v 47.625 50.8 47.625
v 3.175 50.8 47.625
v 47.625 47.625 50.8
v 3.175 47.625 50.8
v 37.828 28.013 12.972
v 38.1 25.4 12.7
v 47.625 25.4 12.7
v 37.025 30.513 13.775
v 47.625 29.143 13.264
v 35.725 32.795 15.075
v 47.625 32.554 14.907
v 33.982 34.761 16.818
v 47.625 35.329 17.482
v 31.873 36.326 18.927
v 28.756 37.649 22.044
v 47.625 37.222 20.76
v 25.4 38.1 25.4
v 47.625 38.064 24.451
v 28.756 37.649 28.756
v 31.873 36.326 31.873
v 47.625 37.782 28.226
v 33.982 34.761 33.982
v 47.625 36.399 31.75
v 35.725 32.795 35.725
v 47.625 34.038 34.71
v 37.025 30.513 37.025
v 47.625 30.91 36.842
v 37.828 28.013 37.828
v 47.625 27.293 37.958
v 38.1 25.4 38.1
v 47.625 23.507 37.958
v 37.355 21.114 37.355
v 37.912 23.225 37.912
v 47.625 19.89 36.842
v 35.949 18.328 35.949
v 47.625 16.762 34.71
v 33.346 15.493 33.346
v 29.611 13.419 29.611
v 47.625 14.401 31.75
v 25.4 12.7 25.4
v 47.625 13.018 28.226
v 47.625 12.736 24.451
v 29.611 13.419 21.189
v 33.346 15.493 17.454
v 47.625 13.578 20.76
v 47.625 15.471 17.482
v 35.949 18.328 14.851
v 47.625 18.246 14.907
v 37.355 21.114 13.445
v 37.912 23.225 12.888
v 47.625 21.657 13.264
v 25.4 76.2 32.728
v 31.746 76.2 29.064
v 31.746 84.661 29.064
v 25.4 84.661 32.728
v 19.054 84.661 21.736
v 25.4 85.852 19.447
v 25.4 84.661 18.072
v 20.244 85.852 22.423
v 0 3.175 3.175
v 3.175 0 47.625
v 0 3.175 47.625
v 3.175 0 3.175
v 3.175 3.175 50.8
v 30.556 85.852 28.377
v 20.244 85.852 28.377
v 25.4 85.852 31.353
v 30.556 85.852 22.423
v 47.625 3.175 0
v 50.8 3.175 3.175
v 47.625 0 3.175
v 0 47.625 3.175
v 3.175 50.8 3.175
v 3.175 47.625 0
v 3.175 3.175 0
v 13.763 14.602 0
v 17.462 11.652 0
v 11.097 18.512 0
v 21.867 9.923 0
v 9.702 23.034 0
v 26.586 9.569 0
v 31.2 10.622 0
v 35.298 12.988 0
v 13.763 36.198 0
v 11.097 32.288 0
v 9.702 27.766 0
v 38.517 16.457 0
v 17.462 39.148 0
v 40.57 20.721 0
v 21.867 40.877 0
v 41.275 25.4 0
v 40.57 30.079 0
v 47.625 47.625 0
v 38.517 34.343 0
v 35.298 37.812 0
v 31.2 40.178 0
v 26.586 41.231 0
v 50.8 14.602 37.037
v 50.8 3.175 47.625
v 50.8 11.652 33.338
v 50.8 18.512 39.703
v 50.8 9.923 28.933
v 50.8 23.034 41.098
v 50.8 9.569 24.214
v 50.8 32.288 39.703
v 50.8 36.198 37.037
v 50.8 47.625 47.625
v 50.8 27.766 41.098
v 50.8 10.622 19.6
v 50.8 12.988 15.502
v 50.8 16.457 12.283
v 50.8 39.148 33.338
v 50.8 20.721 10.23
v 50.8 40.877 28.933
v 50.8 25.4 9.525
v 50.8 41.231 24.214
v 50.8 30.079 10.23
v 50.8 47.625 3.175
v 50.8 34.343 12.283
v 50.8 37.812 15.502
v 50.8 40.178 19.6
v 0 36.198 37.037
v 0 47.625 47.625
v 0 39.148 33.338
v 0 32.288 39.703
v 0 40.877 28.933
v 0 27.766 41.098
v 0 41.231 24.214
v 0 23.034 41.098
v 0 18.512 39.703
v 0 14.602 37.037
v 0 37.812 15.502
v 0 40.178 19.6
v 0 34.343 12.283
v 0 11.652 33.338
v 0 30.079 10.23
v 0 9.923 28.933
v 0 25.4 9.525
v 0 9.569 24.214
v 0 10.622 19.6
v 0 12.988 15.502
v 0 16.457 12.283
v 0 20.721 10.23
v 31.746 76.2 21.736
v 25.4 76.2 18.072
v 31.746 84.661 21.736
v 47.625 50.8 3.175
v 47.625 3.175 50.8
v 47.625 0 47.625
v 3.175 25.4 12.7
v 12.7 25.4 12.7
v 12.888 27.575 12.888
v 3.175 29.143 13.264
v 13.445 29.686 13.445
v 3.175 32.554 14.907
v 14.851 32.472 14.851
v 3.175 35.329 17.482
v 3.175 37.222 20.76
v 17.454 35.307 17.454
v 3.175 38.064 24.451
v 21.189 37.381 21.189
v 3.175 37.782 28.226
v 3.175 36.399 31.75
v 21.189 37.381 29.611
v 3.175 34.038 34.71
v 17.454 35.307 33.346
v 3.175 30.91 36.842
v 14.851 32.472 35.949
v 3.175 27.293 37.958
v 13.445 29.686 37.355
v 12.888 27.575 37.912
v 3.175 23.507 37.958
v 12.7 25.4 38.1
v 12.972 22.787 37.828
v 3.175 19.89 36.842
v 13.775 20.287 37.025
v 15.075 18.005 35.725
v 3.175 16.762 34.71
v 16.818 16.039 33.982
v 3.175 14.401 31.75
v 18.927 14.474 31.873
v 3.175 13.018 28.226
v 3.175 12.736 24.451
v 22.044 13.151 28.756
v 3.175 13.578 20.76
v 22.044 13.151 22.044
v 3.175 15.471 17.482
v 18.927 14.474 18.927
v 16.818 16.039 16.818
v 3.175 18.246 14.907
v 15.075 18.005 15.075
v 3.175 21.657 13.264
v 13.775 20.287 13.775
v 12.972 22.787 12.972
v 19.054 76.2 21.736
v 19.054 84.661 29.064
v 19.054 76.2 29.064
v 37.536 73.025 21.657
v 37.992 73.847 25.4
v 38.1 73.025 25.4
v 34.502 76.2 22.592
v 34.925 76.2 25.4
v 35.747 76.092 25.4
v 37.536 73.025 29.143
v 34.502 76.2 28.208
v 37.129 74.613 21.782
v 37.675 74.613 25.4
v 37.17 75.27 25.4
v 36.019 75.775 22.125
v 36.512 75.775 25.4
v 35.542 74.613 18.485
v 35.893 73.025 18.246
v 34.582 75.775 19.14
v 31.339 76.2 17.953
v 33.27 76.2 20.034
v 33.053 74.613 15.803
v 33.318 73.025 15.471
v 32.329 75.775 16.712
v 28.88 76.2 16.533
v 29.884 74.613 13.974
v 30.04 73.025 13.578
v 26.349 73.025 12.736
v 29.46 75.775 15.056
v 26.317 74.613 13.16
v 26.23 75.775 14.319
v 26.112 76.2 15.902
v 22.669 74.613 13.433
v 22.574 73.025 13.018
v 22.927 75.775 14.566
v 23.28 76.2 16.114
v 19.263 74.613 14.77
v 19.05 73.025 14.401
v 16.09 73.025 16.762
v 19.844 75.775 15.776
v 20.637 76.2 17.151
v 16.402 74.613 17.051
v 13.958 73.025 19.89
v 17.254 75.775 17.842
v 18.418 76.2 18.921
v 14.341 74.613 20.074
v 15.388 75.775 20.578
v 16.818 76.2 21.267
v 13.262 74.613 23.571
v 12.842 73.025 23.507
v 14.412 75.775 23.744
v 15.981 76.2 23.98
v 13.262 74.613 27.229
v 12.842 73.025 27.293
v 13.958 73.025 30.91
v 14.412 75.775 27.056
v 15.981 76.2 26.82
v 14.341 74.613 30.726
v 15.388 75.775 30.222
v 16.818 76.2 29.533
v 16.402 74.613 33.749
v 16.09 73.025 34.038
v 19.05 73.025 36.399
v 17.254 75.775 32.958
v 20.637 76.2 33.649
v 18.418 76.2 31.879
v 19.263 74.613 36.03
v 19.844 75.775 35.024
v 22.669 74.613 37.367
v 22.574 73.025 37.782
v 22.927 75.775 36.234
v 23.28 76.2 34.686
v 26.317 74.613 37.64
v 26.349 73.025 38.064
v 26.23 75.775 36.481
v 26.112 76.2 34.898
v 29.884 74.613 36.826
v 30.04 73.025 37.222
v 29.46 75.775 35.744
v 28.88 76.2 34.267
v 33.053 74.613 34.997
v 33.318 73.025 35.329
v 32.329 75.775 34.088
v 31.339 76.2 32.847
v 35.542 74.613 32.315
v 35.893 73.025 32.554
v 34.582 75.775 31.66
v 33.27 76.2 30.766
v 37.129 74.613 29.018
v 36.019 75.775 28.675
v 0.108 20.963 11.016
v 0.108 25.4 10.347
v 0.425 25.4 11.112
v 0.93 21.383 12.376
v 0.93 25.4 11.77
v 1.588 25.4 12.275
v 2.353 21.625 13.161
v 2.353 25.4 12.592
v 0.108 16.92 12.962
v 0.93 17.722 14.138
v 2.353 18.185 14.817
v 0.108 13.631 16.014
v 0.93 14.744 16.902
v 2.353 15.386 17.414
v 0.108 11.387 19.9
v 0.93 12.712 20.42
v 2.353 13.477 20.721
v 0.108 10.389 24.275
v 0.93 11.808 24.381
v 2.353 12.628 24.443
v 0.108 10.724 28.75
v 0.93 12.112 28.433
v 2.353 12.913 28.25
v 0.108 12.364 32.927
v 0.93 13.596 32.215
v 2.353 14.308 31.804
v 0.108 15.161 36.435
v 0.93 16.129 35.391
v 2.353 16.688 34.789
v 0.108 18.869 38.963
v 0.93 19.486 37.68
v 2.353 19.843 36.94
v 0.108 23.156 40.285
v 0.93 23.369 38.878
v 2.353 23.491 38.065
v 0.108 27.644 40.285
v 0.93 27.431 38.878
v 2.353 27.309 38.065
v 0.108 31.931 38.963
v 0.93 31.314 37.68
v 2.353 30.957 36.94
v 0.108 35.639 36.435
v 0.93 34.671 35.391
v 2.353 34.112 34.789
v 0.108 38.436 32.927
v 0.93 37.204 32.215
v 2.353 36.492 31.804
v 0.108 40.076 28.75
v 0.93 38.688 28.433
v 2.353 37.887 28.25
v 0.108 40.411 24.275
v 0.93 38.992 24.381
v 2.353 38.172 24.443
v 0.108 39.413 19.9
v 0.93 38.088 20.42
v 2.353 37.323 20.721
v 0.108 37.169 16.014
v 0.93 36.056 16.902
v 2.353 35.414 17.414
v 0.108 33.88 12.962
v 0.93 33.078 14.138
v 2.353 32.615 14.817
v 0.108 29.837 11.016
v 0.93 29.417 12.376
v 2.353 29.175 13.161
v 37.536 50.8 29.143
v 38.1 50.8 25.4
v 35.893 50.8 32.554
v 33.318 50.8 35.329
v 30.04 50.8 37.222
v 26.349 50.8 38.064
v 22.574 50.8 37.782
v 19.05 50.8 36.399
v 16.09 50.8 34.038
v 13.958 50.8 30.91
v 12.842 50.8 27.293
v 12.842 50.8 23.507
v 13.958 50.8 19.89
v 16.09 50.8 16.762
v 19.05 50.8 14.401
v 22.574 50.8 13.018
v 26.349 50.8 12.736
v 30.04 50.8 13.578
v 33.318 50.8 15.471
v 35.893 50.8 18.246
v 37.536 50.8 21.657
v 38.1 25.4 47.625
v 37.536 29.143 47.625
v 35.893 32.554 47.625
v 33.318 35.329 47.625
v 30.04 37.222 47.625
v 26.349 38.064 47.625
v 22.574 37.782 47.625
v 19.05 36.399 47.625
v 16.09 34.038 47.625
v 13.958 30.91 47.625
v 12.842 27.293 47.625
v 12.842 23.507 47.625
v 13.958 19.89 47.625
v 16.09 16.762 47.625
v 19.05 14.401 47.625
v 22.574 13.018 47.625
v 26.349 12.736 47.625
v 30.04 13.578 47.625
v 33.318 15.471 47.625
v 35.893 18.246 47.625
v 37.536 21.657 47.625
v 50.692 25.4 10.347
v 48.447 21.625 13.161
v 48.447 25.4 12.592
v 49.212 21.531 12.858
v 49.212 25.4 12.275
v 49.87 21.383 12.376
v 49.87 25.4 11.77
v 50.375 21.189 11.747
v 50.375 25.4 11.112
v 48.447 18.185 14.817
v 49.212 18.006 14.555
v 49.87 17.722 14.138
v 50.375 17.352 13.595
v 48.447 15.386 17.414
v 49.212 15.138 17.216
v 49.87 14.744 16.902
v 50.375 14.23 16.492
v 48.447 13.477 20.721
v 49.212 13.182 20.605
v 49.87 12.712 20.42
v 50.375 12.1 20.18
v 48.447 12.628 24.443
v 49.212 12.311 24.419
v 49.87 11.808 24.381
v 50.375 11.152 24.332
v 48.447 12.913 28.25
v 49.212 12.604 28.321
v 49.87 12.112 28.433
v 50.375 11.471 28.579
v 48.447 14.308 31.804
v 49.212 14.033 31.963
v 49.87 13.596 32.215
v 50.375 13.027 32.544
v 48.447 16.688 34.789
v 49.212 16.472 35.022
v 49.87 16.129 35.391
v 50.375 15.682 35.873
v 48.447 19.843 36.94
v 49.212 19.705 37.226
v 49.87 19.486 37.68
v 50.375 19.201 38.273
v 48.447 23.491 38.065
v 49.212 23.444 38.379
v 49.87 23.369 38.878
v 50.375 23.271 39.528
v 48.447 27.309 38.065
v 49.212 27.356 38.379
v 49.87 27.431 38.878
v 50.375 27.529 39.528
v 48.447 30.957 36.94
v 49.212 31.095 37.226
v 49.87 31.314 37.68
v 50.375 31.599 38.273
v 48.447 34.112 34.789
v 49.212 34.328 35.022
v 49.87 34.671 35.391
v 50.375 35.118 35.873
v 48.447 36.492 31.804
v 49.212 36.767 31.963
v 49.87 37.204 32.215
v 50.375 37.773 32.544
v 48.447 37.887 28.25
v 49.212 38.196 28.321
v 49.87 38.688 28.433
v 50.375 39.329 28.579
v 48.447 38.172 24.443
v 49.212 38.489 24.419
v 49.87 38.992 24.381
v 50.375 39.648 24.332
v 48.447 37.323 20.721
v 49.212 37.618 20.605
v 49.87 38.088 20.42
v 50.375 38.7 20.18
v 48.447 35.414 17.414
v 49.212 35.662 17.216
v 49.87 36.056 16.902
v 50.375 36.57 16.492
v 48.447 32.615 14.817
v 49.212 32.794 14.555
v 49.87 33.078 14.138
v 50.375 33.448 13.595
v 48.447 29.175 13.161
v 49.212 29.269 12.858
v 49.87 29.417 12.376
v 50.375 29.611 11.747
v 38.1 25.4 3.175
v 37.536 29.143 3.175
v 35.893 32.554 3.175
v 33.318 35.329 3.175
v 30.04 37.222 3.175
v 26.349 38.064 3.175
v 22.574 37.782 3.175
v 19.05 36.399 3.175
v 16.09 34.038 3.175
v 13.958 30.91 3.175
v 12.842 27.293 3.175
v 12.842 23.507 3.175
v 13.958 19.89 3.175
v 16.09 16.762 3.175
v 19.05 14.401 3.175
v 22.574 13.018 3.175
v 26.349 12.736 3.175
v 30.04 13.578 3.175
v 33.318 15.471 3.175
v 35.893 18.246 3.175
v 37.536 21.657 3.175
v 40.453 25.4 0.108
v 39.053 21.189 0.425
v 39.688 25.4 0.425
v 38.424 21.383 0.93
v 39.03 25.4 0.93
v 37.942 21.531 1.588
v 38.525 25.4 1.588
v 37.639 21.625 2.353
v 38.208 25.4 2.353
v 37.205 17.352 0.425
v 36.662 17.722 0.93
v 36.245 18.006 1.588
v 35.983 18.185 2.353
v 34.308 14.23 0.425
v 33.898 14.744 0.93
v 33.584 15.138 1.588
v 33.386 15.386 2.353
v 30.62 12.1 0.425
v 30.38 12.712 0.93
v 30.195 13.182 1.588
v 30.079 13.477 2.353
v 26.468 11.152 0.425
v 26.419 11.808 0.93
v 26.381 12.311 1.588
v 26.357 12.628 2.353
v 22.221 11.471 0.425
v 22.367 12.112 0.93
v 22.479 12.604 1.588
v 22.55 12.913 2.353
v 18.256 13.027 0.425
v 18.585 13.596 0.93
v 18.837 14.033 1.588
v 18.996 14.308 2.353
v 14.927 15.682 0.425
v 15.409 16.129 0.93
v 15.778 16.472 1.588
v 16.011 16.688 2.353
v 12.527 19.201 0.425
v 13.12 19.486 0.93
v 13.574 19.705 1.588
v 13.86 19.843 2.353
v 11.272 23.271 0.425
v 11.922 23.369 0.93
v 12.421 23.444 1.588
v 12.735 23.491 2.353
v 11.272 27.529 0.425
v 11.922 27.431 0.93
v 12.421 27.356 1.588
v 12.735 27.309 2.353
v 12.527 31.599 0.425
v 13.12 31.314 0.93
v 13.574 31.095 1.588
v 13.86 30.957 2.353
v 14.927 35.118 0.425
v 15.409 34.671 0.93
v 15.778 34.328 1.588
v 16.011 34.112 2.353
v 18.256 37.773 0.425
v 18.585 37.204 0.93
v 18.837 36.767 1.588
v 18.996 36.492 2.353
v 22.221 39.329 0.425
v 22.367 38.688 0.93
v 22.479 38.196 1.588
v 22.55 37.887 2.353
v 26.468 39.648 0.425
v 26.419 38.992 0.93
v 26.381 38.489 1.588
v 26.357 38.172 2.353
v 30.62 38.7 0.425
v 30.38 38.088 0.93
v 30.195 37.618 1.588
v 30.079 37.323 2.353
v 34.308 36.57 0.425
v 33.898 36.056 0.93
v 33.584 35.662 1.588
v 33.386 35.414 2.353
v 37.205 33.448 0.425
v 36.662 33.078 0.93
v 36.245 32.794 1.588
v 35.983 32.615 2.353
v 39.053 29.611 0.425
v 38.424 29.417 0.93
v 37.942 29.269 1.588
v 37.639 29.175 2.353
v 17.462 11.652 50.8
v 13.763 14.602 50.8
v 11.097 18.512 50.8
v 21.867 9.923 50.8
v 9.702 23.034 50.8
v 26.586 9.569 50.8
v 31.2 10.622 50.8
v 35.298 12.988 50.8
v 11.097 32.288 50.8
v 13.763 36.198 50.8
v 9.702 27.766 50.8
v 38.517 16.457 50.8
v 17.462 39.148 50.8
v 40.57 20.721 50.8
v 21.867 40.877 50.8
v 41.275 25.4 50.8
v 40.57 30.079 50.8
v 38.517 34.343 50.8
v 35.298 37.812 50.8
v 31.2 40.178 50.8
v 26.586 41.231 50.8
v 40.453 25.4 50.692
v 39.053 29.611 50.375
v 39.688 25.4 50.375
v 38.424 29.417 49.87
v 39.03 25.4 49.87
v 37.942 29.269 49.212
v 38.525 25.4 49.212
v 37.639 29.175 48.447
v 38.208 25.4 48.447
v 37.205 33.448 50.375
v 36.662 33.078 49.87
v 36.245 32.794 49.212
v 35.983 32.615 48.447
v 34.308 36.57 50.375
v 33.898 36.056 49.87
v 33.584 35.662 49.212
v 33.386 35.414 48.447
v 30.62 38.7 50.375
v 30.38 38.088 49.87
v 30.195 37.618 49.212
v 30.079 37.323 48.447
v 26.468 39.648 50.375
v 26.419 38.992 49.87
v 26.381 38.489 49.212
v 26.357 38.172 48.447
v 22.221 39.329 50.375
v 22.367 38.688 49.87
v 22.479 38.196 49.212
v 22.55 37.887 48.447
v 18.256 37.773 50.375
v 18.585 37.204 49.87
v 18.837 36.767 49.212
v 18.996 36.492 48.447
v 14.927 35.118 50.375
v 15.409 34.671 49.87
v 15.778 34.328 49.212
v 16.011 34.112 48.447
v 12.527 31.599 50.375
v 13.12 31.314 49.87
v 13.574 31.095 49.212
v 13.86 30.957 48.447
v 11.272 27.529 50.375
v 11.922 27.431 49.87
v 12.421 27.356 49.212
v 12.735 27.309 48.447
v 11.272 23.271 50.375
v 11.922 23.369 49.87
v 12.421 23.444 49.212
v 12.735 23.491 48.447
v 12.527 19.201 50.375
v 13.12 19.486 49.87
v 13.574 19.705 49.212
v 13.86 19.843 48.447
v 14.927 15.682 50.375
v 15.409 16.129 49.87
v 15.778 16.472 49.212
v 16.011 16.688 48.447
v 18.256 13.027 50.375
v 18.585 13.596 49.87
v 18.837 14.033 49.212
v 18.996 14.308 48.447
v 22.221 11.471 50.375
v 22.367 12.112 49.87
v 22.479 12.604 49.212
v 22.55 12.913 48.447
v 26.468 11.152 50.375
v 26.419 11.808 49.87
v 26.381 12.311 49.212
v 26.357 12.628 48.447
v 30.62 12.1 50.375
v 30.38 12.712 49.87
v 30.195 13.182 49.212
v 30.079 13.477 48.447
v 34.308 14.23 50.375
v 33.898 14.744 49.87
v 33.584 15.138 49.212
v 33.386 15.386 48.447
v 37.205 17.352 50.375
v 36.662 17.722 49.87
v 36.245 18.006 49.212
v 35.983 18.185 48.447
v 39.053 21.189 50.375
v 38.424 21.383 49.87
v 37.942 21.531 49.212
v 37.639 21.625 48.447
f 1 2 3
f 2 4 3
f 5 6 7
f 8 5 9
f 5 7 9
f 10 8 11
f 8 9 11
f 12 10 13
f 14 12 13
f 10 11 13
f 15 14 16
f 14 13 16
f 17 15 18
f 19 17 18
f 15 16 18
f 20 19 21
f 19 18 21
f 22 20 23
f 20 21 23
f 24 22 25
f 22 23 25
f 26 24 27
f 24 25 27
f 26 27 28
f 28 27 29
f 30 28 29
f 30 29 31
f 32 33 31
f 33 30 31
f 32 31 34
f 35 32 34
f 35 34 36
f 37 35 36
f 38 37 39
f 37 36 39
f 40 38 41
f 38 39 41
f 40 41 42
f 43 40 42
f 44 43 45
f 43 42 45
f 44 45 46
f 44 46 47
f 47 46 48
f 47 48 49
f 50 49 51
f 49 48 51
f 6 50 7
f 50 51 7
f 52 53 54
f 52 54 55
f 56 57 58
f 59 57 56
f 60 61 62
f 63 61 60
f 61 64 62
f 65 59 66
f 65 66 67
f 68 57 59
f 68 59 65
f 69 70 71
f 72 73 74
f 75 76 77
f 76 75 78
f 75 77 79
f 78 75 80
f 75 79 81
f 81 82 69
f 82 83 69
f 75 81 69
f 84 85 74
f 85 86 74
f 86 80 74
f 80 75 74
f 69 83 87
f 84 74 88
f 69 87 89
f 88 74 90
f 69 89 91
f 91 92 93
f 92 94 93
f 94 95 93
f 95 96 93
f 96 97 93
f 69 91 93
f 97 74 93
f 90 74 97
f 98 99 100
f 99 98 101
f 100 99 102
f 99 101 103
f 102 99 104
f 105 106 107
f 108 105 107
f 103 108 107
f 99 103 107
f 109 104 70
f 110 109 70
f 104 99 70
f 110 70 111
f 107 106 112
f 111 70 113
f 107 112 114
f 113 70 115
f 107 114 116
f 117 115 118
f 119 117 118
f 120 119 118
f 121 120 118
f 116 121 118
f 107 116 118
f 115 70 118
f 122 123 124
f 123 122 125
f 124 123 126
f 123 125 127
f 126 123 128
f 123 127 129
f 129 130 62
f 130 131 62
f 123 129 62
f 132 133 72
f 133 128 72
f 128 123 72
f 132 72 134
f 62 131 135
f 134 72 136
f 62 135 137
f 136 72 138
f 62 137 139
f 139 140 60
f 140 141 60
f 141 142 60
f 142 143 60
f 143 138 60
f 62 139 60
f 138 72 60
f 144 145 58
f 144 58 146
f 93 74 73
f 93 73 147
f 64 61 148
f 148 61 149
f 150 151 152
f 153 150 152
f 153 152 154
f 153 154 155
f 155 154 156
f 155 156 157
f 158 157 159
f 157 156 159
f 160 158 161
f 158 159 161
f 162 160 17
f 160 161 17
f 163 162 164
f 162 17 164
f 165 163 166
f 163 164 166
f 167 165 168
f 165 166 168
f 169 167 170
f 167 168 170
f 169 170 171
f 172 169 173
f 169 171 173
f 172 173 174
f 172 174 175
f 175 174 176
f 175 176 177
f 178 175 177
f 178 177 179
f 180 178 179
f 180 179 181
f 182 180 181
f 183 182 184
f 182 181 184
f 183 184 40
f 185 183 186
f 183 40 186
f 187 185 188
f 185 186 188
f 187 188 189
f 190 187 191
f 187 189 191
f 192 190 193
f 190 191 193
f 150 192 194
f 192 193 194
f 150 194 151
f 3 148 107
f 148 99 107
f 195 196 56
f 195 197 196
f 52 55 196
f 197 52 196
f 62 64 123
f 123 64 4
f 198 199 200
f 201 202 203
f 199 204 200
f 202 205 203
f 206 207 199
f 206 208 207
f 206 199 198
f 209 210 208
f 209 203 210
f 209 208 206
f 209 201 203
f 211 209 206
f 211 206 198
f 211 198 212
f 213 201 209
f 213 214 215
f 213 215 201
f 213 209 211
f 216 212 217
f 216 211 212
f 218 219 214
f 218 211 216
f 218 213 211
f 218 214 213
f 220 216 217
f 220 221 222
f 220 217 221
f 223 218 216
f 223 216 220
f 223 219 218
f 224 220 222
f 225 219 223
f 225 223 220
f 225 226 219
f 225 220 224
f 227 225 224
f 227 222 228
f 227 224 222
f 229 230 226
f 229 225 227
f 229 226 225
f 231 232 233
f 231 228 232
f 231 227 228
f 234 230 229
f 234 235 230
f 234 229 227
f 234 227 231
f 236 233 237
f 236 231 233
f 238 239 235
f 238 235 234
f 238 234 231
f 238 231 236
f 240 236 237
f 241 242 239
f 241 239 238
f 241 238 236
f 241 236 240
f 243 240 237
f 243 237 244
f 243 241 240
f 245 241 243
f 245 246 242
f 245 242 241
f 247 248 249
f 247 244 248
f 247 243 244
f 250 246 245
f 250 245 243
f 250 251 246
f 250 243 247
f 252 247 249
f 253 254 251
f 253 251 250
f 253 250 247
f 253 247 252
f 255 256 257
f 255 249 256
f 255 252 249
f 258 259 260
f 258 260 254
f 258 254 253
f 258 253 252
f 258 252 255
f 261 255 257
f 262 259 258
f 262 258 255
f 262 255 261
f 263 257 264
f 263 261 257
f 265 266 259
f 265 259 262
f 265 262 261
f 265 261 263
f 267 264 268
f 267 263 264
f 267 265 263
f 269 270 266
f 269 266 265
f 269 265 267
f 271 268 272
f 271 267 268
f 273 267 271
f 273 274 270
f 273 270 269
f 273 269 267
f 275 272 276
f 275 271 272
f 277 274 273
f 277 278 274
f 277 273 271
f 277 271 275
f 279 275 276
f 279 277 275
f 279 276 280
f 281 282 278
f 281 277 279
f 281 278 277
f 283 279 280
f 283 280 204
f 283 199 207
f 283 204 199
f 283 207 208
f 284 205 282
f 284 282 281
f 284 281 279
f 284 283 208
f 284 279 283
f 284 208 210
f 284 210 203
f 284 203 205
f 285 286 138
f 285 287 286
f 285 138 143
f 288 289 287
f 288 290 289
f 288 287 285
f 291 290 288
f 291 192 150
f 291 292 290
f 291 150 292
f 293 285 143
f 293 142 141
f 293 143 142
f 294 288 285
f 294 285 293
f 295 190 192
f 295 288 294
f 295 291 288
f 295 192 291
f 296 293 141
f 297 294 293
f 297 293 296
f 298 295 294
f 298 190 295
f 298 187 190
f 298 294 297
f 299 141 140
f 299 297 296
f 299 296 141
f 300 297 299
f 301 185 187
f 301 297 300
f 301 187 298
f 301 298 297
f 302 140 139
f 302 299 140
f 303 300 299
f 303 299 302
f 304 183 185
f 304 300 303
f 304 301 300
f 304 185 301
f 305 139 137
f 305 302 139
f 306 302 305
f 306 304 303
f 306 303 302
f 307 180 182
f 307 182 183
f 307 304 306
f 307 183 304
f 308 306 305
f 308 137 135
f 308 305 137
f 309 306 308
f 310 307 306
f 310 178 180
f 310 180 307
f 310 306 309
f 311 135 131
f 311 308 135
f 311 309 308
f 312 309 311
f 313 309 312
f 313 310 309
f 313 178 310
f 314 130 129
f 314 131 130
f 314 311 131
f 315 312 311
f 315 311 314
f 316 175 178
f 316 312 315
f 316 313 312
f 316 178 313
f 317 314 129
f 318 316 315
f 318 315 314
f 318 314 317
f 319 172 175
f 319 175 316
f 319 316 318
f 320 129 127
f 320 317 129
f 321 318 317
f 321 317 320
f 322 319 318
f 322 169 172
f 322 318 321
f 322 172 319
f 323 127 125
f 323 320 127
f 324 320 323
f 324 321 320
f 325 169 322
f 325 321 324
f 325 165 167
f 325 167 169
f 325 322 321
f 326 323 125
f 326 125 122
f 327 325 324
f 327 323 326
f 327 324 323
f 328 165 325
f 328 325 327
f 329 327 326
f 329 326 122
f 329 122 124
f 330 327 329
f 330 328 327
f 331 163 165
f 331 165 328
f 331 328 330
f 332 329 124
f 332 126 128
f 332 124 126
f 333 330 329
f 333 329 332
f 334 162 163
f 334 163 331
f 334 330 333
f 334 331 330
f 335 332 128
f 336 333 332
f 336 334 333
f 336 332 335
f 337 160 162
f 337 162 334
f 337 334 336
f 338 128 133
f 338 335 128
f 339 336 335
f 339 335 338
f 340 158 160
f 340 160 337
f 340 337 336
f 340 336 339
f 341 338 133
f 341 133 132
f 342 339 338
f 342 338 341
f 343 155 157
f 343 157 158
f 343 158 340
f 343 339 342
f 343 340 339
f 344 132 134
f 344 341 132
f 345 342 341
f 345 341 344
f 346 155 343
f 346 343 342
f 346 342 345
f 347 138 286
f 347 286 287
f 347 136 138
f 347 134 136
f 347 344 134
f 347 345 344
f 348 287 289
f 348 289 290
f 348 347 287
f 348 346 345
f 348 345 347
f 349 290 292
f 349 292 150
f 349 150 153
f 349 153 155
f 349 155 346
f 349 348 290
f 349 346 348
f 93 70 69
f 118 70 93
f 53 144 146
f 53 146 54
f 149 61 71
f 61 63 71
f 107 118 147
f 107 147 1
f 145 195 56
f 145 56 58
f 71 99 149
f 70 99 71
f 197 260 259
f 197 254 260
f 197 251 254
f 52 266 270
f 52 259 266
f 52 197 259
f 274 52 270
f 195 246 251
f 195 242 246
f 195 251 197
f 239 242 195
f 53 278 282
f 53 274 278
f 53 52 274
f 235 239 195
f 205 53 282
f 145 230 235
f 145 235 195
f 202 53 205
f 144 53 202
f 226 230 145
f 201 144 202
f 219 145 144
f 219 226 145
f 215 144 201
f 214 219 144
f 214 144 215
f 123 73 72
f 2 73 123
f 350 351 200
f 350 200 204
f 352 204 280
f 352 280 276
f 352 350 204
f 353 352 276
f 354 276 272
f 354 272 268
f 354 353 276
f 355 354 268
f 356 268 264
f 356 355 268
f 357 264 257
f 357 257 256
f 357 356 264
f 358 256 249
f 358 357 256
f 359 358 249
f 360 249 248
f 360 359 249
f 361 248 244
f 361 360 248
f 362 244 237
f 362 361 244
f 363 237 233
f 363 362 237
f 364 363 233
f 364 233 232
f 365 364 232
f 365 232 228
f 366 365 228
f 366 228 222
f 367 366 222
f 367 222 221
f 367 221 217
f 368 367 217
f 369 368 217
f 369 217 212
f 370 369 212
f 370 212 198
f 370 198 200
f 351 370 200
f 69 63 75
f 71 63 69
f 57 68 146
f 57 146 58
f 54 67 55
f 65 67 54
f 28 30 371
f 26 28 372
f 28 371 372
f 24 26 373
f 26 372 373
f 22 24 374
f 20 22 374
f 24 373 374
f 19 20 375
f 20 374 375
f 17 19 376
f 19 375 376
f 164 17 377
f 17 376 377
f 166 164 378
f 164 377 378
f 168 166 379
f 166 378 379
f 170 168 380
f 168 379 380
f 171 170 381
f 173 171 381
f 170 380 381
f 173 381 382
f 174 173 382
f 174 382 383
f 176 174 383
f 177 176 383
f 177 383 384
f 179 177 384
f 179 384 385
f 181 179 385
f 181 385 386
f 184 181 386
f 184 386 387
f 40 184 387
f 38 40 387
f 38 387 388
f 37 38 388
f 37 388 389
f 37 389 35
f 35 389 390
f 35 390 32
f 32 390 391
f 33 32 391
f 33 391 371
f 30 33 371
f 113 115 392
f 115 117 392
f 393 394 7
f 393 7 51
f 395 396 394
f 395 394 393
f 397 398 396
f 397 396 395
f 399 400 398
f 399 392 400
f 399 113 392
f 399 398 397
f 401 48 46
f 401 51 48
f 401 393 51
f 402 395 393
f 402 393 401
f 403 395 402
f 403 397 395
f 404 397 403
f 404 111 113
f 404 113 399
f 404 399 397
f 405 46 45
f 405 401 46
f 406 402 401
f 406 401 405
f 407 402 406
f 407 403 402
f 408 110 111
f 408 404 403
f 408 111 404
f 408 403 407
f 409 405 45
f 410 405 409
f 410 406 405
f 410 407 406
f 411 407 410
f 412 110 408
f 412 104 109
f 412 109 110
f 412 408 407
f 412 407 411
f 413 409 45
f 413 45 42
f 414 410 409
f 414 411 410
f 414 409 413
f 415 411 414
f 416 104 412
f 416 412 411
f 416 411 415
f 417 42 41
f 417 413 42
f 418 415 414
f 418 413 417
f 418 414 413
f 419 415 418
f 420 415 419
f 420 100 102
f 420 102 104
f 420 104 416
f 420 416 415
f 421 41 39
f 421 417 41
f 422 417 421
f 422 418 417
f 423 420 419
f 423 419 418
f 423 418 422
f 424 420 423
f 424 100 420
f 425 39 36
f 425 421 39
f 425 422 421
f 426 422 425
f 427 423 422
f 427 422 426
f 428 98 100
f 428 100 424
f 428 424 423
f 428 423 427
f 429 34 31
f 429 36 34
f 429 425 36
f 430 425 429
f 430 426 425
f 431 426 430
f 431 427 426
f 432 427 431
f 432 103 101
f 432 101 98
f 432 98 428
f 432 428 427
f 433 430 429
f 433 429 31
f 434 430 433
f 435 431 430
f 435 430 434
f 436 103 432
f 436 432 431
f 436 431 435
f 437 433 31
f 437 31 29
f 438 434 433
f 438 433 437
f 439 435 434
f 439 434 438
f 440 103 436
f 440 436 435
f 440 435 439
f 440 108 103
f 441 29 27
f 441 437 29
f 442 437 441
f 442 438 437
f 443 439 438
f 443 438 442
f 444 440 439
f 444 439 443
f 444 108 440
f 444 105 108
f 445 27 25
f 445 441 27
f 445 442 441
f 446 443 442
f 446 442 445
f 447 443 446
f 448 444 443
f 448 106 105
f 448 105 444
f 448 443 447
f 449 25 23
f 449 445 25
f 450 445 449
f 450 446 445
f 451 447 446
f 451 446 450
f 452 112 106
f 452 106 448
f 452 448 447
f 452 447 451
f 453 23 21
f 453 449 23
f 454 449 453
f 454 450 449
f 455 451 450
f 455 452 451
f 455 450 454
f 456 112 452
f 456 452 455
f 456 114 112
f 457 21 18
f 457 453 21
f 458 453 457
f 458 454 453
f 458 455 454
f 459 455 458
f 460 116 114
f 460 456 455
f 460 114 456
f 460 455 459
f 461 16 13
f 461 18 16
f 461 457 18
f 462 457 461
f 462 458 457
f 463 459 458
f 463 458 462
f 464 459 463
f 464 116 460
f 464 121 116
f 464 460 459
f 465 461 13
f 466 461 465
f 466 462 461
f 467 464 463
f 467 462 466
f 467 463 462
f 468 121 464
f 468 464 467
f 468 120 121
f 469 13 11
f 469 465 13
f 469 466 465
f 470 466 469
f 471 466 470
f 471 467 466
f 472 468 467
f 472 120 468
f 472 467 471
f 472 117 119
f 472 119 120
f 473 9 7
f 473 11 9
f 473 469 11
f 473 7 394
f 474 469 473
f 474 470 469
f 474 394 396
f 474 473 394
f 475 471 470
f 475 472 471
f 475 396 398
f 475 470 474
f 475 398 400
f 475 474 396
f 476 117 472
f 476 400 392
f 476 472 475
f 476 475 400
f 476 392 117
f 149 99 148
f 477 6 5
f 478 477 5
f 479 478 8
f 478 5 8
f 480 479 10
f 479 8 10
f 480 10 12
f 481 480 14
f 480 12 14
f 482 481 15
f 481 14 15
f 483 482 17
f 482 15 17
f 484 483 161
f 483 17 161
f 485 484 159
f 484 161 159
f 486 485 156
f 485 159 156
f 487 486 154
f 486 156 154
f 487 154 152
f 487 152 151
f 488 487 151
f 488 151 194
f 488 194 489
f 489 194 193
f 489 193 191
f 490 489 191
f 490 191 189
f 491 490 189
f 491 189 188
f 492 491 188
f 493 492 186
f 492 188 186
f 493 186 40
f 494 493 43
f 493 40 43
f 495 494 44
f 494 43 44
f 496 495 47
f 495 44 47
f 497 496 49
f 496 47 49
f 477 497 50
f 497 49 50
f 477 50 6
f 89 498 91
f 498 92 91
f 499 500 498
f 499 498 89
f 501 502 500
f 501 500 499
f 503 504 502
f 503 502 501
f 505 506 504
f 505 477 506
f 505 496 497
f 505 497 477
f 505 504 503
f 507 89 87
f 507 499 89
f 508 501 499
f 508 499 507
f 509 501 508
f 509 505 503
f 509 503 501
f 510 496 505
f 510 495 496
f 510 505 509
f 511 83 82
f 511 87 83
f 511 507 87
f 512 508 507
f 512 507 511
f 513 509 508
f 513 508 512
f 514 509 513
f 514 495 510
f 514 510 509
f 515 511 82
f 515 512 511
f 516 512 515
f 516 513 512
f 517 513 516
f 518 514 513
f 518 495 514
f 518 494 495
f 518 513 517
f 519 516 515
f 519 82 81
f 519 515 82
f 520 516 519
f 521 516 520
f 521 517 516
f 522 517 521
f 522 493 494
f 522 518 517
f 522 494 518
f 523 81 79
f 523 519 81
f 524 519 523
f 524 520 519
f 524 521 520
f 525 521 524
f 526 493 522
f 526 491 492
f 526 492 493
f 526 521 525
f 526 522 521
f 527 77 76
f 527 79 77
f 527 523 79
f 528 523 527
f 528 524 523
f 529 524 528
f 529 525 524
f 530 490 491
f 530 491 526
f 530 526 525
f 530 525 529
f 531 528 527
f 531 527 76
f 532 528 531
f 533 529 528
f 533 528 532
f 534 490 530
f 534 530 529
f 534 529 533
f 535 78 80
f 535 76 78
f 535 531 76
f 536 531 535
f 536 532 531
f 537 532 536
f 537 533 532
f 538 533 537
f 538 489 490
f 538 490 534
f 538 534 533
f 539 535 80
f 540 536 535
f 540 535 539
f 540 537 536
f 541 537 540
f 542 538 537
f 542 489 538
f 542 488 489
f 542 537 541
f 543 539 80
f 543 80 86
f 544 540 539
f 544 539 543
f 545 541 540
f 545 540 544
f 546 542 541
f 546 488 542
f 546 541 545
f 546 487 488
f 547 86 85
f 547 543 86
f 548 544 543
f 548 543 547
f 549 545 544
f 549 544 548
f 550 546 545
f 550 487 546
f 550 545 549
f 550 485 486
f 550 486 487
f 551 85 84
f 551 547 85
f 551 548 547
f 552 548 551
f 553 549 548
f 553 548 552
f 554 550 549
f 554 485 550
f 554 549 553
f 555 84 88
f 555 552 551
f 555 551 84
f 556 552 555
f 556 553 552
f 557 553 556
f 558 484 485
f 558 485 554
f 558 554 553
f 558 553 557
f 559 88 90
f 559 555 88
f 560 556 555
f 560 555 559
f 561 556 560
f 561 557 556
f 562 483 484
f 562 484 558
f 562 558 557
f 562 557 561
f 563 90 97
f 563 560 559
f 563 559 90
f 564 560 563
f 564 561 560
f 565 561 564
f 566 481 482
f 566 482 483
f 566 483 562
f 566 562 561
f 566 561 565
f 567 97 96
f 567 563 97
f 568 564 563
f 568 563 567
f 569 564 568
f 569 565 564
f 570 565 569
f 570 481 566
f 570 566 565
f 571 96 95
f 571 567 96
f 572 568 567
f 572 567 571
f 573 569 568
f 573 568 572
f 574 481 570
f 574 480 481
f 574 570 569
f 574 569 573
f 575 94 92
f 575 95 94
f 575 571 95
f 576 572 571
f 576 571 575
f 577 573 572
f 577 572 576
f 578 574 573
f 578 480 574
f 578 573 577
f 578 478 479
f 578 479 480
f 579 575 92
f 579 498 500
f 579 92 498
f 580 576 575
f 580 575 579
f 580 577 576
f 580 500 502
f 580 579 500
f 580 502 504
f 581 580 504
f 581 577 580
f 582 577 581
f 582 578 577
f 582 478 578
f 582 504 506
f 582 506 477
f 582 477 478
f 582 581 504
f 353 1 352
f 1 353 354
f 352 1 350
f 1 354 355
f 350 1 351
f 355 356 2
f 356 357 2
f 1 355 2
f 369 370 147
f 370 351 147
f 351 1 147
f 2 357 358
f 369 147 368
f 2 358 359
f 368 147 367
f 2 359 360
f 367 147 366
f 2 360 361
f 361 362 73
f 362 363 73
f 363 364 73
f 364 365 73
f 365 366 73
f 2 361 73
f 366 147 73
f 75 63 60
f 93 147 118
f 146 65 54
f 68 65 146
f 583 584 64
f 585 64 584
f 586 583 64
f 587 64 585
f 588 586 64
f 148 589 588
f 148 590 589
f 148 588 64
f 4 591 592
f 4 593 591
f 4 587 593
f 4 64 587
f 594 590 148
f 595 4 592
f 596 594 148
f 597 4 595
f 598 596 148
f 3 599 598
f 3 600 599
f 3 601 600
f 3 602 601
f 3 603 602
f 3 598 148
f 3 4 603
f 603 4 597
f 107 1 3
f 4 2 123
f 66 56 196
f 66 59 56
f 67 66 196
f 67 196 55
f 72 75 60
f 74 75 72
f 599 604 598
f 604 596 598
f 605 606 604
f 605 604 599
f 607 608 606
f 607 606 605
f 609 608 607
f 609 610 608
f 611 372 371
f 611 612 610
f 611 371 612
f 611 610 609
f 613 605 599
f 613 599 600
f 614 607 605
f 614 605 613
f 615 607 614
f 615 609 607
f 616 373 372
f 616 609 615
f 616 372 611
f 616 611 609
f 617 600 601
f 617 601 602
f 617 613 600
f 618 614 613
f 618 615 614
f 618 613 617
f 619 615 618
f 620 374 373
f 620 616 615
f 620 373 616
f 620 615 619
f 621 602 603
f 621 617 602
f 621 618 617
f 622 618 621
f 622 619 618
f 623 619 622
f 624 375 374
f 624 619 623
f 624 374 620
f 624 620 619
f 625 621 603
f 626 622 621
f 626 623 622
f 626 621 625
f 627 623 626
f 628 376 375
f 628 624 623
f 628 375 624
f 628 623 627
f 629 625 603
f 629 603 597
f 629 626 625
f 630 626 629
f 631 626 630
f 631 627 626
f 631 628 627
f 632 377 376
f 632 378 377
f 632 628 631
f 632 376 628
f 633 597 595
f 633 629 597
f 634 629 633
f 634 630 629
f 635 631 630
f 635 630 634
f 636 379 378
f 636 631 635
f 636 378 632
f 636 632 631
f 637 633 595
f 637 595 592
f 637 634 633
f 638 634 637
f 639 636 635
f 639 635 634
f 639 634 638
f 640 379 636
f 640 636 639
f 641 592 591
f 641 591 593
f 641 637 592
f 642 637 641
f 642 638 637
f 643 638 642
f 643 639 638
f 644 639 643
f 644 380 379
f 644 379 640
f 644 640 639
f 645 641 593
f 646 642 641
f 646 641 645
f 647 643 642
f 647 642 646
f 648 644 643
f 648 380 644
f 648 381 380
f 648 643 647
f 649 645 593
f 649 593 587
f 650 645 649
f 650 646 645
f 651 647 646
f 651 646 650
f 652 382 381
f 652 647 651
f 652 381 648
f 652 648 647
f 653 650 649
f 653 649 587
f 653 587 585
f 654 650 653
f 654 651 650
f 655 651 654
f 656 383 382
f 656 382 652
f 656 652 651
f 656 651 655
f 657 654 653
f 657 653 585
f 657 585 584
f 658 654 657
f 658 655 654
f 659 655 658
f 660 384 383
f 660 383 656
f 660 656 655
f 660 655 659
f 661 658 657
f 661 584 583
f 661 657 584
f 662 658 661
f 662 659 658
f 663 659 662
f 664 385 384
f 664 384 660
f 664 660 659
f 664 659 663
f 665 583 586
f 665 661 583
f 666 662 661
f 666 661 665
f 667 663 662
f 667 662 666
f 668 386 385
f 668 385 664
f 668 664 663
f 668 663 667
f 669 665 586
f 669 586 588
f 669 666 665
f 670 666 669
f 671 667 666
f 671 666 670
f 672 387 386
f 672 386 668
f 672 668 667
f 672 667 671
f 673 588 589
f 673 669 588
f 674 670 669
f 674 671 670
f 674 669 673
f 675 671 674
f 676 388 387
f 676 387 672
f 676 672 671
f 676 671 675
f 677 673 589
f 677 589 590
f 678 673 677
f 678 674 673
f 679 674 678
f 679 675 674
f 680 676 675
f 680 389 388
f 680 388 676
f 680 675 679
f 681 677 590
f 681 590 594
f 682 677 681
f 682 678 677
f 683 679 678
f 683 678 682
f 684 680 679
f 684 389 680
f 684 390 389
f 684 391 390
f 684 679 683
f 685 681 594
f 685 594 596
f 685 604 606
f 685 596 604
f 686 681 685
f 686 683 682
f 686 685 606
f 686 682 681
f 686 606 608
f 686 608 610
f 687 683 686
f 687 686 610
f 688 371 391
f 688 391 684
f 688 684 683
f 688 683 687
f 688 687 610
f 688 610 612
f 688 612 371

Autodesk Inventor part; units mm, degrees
ref_plane "YZ Plane" through (0, 0, 0) normal (1, 0, 0) x (0, 1, 0)
ref_plane "XZ Plane" through (0, 0, 0) normal (0, 1, 0) x (-1, 0, 0)
ref_plane "XY Plane" through (0, 0, 0) normal (0, 0, 1) x (1, 0, 0)
sketch "Sketch1" plane through (0, 0, 0) normal (0, 0, 1) x (1, 0, 0)
  line L0 (0, 0) -> (50.8, 0)
  line L1 (50.8, 0) -> (50.8, 50.8)
  line L2 (50.8, 50.8) -> (0, 50.8)
  line L3 (0, 50.8) -> (0, 0)
  dimension "d0" = 50.8
  dimension "d1" = 50.8
extrude "Extrusion1" add sketch "Sketch1" along normal blind 50.8
sketch "Sketch2" plane through (0, 0, 50.8) normal (0, 0, 1) x (1, 0, 0)
  point P0 (0, 0)
sketch "Sketch3" plane through (0, 0, 50.8) normal (0, 0, 1) x (1, 0, 0)
  circle A0 centre (25.4, 25.4) radius 12.7
  line L0 (0, 50.8) -> (0, 0) projected
  line L1 (50.8, 50.8) -> (0, 50.8) projected
  dimension "d4" = 25.4
  dimension "d5" = 25.4
  dimension "d6" = 25.4
extrude "Extrusion2" cut sketch "Sketch3" against normal blind 50.8
sketch "Sketch4" plane through (50.8, 0, 0) normal (1, 0, 0) x (0, 0, -1)
  circle A0 centre (-25.4, 25.4) radius 12.7
  line L0 (-50.8, 0) -> (-50.8, 50.8) projected
  line L1 (0, 0) -> (0, 50.8) projected
  line L2 (0, 0) -> (-50.8, 0) projected
  dimension "d9" = 25.4
  dimension "d10" = 25.4
  dimension "d11" = 25.4
  dimension "d12" = 25.4
extrude "Extrusion3" cut sketch "Sketch4" against normal blind 50.8
chamfer "Chamfer1" distance 3.175 angle 45 12 edges at (25.4, 50.8, 50.8) (0, 50.8, 25.4) (25.4, 50.8, 0) (50.8, 50.8, 25.4) (50.8, 25.4, 50.8) (50.8, 25.4, 0) (50.8, 0, 25.4) (25.4, 0, 0) (25.4, 0, 50.8) (0, 25.4, 50.8) (0, 0, 25.4) (0, 25.4, 0)
fillet "Fillet1" radius 3.175 4 edges at (12.7, 25.4, 50.8) (50.8, 25.4, 38.1) (12.7, 25.4, 0) (0, 25.4, 38.1)
sketch "Sketch5" plane through (3.175, 50.8, 3.175) normal (0, 1, 0) x (1, 0, 0)
  line L0 (22.225, -22.225) -> (9.525, -34.925) projected
  circle A0 centre (22.225, -22.225) radius 12.7
  point P0 (-3.175, 3.175)
  dimension "d19" = 25.4
extrude "Extrusion4" add sketch "Sketch5" along normal blind 25.4
sketch "Sketch6" plane through (25.4, 76.2, 25.4) normal (0, 1, 0) x (1, 0, 0)
  point P0 (-25.4, 25.4)
fillet "Fillet2" radius 3.175 1 edges at (12.7, 76.2, 25.4)
sketch "Sketch12" plane through (25.4, 76.2, 25.4) normal (0, 1, 0) x (1, 0, 0)
  line L0 (-12.7, 12.7) -> (0, 0) projected
  circle A0 centre (0, 0) radius 7.3279
  line L1 (0, 7.3279) -> (6.3461, 3.6639)
  line L2 (6.3461, 3.6639) -> (6.3461, -3.6639)
  line L3 (6.3461, -3.6639) -> (0, -7.3279)
  line L4 (0, -7.3279) -> (-6.3461, -3.664)
  line L5 (-6.3461, -3.664) -> (-6.3461, 3.6639)
  line L6 (-6.3461, 3.6639) -> (0, 7.3279)
  point P0 (-25.4, 25.4)
  dimension "d33" = 14.6558
sketch "Sketch13" plane through (25.4, 76.2, 25.4) normal (0, 1, 0) x (1, 0, 0)
  point P0 (-25.4, 25.4)
extrude "Extrusion7" add sketch "Sketch12" along normal blind 9.652 contours L6 L1 L2 L3 L4 L5
chamfer "Chamfer4" distance 1.1906 angle 45 6 edges at (22.2269, 85.852, 30.8959) (28.5731, 85.852, 30.8959) (31.7461, 85.852, 25.4) (28.5731, 85.852, 19.9041) (22.2269, 85.852, 19.9041) (19.0539, 85.852, 25.4)
properties part number "orthographic3"
